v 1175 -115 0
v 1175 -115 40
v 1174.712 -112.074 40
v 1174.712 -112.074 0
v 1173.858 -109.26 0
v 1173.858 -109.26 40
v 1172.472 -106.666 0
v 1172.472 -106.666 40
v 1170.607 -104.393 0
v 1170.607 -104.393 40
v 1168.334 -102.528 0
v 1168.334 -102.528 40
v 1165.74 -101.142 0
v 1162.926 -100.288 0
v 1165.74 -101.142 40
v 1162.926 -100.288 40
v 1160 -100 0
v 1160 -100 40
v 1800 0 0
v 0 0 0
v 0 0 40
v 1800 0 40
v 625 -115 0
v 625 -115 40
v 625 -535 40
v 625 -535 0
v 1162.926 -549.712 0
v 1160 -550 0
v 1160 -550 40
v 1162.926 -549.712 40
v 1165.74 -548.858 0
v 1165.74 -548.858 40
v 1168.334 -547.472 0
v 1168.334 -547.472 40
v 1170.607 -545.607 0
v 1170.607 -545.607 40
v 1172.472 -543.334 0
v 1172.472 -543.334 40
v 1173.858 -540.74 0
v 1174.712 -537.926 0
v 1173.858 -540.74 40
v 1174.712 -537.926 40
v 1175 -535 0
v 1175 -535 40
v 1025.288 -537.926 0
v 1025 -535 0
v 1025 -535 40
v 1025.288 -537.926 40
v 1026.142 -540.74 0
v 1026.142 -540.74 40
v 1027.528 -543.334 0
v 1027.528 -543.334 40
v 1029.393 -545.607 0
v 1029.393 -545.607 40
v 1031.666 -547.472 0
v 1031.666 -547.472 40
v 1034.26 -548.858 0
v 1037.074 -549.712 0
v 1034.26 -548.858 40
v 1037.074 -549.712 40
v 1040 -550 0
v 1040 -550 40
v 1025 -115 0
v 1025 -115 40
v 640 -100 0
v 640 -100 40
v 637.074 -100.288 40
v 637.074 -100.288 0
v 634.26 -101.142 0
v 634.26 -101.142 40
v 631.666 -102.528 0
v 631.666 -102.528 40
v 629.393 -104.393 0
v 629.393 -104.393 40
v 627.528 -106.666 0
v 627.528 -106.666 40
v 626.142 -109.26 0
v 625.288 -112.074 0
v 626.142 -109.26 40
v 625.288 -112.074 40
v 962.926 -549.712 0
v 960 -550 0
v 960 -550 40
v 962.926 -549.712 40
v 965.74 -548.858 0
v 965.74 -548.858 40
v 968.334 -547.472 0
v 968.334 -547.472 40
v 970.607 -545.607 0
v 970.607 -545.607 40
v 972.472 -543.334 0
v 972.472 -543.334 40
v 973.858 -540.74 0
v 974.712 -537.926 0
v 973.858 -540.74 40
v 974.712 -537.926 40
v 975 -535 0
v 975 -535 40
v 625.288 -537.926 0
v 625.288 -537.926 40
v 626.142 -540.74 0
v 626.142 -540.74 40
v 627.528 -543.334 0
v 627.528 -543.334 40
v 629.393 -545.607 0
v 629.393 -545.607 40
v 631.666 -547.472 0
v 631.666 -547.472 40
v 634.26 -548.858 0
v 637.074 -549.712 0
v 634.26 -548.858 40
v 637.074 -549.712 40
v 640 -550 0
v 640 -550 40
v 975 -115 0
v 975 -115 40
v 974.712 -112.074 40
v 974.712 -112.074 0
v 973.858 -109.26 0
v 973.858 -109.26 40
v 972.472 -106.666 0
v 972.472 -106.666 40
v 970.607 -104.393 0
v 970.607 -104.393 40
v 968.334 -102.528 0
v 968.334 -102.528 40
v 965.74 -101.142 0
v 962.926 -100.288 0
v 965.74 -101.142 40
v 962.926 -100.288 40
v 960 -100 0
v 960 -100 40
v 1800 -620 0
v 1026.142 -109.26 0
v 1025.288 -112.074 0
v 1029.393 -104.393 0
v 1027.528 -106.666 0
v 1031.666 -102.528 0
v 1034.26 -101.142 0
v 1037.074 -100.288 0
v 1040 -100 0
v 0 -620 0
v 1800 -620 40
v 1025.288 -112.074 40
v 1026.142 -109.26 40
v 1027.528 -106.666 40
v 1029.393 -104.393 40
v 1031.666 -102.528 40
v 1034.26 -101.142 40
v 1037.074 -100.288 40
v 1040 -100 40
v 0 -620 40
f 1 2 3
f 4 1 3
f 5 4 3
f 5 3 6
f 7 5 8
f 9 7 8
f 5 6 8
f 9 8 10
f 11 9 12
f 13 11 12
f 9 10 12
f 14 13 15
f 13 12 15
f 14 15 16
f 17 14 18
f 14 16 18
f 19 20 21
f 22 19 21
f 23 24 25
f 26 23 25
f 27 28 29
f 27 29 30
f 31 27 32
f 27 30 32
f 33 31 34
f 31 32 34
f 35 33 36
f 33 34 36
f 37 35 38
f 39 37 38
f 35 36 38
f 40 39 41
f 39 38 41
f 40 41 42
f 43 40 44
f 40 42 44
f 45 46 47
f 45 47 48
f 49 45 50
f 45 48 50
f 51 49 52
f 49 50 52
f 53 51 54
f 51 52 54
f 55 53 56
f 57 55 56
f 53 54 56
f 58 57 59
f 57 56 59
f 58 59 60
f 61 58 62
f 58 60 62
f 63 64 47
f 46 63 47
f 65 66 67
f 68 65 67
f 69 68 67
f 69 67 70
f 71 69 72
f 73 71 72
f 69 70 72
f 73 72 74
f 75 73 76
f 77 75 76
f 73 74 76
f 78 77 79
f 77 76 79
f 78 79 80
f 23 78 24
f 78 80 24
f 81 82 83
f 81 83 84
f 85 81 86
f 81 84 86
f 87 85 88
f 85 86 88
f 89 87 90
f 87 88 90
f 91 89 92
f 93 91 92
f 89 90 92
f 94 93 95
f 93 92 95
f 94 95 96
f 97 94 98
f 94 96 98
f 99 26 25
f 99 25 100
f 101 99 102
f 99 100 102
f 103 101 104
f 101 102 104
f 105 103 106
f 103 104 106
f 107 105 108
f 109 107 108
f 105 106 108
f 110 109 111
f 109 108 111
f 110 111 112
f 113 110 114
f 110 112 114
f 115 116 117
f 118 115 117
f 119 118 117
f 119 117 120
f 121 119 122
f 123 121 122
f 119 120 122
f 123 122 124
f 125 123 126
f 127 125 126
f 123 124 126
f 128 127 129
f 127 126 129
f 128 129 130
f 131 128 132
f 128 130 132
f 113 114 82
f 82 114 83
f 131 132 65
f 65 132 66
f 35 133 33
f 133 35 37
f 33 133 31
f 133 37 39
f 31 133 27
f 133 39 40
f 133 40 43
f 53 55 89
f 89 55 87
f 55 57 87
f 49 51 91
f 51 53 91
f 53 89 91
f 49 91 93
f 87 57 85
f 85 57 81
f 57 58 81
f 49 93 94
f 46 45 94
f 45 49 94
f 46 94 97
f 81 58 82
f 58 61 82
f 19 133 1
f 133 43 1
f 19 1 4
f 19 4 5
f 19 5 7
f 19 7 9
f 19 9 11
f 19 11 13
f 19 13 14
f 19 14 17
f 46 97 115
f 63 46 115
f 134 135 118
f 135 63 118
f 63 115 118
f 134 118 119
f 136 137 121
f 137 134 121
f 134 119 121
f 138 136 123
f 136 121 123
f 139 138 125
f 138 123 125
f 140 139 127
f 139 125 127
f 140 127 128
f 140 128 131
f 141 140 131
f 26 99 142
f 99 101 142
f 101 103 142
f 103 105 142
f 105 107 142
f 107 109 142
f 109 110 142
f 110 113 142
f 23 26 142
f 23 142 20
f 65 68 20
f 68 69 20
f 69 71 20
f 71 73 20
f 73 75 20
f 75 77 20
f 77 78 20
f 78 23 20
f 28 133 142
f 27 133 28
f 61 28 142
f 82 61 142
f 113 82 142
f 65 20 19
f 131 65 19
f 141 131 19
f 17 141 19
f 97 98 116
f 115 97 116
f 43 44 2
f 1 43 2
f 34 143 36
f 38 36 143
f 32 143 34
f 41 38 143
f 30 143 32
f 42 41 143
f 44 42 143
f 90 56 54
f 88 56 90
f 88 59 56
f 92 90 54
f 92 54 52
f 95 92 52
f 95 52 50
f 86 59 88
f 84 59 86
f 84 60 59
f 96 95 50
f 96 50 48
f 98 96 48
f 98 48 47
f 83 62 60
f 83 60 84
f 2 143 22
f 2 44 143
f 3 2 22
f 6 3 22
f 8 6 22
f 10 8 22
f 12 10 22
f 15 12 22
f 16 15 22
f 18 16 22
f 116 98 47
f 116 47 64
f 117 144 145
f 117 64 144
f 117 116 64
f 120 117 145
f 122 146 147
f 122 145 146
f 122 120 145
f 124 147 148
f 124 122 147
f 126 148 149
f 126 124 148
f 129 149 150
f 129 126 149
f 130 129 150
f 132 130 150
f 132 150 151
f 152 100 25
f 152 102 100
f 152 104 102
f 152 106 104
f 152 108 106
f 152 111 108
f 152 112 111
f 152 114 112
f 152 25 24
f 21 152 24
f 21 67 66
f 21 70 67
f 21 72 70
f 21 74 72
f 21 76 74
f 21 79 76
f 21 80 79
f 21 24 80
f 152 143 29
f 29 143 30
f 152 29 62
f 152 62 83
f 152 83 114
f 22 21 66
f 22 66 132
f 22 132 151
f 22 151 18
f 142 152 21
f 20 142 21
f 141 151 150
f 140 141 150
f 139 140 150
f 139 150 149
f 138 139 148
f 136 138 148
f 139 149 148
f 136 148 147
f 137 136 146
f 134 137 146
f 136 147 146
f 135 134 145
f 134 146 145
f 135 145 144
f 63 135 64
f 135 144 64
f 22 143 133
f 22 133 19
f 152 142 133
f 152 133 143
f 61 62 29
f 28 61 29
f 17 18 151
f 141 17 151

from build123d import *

# Parameters (mm, degrees)
F0_W     = 620
F0_H     = 40
F1_DEPTH = 1800
F3_DEPTH = 40.001


# Not quite as in the source:
# - a feature of the source that left no trace in its solid (it failed there, or was rolled back) is left out


with BuildPart() as f1:
    # F0 (on Right) → F1 (new body)
    with BuildSketch(Plane.YZ):
        with Locations((-310, 20)):
            Rectangle(F0_W, F0_H)
    extrude(amount=F1_DEPTH)

    # F2 (on face) → F3 (cut, through all)
    with BuildSketch(Plane.XY.offset(40)):
        with BuildLine():
            Line((960, -100), (640, -100))
            ThreePointArc((640, -100), (629.3933982822, -104.3933982822), (625, -115))
            Line((625, -115), (625, -535))
            ThreePointArc((625, -535), (629.3933982822, -545.6066017178), (640, -550))
            Line((640, -550), (960, -550))
            ThreePointArc((960, -550), (970.6066017178, -545.6066017178), (975, -535))
            Line((975, -535), (975, -115))
            ThreePointArc((975, -115), (970.6066017178, -104.3933982822), (960, -100))
        make_face()
        with BuildLine():
            Line((1160, -100), (1040, -100))
            ThreePointArc((1040, -100), (1029.3933982822, -104.3933982822), (1025, -115))
            Line((1025, -115), (1025, -535))
            ThreePointArc((1025, -535), (1029.3933982822, -545.6066017178), (1040, -550))
            Line((1040, -550), (1160, -550))
            ThreePointArc((1160, -550), (1170.6066017178, -545.6066017178), (1175, -535))
            Line((1175, -535), (1175, -115))
            ThreePointArc((1175, -115), (1170.6066017178, -104.3933982822), (1160, -100))
        make_face()
    extrude(amount=-F3_DEPTH, mode=Mode.SUBTRACT)


solid = f1.part
